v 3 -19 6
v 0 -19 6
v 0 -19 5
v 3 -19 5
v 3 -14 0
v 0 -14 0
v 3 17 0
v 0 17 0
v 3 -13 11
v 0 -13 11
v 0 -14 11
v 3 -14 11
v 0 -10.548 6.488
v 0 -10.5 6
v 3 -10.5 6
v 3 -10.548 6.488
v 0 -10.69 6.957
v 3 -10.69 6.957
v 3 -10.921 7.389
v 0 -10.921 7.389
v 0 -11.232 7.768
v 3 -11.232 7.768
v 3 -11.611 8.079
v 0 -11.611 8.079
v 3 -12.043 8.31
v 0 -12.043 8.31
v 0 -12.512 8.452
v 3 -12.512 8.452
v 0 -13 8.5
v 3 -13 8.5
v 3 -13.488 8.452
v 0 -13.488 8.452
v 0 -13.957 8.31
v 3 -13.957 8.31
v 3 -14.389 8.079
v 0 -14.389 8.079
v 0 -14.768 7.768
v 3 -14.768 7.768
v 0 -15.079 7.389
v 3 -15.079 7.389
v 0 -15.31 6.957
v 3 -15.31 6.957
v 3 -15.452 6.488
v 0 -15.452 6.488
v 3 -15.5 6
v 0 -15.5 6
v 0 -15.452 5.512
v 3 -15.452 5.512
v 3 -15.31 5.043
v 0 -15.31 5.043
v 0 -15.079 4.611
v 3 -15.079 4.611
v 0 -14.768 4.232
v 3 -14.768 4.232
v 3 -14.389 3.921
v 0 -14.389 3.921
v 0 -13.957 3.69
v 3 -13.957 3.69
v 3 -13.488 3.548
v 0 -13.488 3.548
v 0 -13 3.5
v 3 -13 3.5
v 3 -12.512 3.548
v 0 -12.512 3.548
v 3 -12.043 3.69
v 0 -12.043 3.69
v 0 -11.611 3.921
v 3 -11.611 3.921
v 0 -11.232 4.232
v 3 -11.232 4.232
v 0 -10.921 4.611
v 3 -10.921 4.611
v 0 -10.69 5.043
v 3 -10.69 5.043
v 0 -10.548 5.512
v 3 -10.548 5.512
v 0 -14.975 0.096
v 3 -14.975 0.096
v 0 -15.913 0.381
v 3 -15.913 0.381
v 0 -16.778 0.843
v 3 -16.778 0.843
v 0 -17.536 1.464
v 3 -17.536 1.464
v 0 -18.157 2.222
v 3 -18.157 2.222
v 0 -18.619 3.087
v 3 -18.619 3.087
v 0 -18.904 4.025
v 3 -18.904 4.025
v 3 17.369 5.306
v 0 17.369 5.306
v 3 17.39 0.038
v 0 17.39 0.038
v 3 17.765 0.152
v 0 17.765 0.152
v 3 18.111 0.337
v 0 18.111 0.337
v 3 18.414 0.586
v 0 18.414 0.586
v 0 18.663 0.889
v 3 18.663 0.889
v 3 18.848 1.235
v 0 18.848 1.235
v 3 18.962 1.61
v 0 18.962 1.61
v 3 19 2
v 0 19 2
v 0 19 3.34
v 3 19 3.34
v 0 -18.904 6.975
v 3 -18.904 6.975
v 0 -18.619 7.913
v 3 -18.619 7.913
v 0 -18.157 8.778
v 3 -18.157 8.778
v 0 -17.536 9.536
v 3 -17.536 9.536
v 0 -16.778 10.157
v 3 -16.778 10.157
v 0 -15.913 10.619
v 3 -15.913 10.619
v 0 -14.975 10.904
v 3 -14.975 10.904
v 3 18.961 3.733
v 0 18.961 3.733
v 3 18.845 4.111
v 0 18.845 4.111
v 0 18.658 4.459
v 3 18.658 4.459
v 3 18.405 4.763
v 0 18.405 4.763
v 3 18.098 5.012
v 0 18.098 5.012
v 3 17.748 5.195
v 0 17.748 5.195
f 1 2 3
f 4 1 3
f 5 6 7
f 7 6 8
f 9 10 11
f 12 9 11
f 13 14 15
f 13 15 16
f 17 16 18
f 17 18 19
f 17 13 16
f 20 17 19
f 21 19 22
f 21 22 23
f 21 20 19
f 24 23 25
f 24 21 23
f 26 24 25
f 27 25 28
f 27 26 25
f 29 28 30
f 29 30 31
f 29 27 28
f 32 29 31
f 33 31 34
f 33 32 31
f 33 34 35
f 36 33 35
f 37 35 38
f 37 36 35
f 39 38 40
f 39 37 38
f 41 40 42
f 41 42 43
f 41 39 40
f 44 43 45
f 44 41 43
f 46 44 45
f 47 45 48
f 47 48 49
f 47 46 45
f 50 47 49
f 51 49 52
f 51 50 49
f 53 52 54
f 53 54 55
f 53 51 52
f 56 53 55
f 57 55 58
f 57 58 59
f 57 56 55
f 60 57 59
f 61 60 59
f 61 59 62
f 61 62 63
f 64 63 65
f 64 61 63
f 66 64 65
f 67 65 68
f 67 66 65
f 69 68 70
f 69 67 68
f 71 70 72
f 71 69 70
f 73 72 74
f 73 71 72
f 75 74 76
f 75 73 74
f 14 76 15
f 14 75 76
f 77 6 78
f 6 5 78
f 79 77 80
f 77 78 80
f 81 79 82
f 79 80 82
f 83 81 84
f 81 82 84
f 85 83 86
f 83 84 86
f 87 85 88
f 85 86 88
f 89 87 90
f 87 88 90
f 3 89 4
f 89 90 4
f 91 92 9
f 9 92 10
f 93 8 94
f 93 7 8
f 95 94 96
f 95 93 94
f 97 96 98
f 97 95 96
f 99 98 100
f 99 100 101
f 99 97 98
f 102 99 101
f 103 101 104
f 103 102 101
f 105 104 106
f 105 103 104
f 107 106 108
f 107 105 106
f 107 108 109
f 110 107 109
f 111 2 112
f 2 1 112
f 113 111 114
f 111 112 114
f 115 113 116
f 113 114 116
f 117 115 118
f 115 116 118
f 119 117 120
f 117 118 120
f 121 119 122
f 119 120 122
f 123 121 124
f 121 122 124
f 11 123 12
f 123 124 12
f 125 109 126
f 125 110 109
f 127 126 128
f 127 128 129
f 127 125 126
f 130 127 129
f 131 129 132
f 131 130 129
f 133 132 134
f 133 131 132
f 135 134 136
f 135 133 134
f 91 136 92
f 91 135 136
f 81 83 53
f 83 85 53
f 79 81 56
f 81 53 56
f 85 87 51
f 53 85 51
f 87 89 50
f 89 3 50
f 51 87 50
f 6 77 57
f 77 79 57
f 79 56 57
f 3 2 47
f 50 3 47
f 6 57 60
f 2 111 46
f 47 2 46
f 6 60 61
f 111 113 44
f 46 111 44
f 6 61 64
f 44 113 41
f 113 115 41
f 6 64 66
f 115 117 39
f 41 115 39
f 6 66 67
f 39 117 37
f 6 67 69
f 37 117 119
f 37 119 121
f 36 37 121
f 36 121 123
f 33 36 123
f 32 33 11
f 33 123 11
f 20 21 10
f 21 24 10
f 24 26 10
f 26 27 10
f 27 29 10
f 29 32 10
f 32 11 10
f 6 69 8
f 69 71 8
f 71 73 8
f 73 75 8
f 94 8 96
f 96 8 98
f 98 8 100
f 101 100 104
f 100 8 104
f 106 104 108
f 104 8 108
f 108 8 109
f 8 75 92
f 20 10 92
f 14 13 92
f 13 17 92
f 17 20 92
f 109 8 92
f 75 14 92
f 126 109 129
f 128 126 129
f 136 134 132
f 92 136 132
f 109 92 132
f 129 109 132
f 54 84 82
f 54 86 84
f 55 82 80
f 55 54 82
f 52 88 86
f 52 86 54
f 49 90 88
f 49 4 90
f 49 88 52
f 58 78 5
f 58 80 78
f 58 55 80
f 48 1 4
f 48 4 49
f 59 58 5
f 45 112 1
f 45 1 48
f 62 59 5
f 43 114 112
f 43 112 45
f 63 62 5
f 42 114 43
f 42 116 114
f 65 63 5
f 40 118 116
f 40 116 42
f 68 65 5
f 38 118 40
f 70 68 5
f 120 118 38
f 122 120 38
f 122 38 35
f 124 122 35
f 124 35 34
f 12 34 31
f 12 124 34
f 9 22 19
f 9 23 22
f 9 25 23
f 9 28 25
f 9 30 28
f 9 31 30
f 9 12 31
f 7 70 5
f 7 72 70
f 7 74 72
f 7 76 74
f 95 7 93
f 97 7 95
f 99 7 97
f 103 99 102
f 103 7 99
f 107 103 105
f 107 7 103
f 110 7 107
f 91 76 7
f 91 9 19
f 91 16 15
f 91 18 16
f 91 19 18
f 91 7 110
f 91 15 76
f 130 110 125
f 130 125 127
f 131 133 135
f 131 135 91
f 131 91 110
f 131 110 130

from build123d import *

# Parameters (mm, degrees)
F0_R     = 2.5
F1_DEPTH = 3
F2_R     = 2
F3_R     = 5
F4_R     = 2


with BuildPart() as f1:
    # F0 (on Right) → F1 (new body)
    with BuildSketch(Plane.YZ):
        Polygon((-19, 11), (-19, 0), (19, 0), (19, 5), (-13, 11), align=None)
        with Locations((-13, 6)):
            Circle(F0_R, mode=Mode.SUBTRACT)
    extrude(amount=F1_DEPTH)

    # F2
    f2_edges = [f1.edges().sort_by_distance(p)[0] for p in [
        (1.5, 19, 0),
    ]]
    fillet(f2_edges, radius=F2_R)

    # F3
    f3_edges = [f1.edges().sort_by_distance(p)[0] for p in [
        (1.5, -19, 11),
        (1.5, -19, 0),
    ]]
    fillet(f3_edges, radius=F3_R)

    # F4
    f4_edges = [f1.edges().sort_by_distance(p)[0] for p in [
        (1.5, 19, 5),
    ]]
    fillet(f4_edges, radius=F4_R)


solid = f1.part
